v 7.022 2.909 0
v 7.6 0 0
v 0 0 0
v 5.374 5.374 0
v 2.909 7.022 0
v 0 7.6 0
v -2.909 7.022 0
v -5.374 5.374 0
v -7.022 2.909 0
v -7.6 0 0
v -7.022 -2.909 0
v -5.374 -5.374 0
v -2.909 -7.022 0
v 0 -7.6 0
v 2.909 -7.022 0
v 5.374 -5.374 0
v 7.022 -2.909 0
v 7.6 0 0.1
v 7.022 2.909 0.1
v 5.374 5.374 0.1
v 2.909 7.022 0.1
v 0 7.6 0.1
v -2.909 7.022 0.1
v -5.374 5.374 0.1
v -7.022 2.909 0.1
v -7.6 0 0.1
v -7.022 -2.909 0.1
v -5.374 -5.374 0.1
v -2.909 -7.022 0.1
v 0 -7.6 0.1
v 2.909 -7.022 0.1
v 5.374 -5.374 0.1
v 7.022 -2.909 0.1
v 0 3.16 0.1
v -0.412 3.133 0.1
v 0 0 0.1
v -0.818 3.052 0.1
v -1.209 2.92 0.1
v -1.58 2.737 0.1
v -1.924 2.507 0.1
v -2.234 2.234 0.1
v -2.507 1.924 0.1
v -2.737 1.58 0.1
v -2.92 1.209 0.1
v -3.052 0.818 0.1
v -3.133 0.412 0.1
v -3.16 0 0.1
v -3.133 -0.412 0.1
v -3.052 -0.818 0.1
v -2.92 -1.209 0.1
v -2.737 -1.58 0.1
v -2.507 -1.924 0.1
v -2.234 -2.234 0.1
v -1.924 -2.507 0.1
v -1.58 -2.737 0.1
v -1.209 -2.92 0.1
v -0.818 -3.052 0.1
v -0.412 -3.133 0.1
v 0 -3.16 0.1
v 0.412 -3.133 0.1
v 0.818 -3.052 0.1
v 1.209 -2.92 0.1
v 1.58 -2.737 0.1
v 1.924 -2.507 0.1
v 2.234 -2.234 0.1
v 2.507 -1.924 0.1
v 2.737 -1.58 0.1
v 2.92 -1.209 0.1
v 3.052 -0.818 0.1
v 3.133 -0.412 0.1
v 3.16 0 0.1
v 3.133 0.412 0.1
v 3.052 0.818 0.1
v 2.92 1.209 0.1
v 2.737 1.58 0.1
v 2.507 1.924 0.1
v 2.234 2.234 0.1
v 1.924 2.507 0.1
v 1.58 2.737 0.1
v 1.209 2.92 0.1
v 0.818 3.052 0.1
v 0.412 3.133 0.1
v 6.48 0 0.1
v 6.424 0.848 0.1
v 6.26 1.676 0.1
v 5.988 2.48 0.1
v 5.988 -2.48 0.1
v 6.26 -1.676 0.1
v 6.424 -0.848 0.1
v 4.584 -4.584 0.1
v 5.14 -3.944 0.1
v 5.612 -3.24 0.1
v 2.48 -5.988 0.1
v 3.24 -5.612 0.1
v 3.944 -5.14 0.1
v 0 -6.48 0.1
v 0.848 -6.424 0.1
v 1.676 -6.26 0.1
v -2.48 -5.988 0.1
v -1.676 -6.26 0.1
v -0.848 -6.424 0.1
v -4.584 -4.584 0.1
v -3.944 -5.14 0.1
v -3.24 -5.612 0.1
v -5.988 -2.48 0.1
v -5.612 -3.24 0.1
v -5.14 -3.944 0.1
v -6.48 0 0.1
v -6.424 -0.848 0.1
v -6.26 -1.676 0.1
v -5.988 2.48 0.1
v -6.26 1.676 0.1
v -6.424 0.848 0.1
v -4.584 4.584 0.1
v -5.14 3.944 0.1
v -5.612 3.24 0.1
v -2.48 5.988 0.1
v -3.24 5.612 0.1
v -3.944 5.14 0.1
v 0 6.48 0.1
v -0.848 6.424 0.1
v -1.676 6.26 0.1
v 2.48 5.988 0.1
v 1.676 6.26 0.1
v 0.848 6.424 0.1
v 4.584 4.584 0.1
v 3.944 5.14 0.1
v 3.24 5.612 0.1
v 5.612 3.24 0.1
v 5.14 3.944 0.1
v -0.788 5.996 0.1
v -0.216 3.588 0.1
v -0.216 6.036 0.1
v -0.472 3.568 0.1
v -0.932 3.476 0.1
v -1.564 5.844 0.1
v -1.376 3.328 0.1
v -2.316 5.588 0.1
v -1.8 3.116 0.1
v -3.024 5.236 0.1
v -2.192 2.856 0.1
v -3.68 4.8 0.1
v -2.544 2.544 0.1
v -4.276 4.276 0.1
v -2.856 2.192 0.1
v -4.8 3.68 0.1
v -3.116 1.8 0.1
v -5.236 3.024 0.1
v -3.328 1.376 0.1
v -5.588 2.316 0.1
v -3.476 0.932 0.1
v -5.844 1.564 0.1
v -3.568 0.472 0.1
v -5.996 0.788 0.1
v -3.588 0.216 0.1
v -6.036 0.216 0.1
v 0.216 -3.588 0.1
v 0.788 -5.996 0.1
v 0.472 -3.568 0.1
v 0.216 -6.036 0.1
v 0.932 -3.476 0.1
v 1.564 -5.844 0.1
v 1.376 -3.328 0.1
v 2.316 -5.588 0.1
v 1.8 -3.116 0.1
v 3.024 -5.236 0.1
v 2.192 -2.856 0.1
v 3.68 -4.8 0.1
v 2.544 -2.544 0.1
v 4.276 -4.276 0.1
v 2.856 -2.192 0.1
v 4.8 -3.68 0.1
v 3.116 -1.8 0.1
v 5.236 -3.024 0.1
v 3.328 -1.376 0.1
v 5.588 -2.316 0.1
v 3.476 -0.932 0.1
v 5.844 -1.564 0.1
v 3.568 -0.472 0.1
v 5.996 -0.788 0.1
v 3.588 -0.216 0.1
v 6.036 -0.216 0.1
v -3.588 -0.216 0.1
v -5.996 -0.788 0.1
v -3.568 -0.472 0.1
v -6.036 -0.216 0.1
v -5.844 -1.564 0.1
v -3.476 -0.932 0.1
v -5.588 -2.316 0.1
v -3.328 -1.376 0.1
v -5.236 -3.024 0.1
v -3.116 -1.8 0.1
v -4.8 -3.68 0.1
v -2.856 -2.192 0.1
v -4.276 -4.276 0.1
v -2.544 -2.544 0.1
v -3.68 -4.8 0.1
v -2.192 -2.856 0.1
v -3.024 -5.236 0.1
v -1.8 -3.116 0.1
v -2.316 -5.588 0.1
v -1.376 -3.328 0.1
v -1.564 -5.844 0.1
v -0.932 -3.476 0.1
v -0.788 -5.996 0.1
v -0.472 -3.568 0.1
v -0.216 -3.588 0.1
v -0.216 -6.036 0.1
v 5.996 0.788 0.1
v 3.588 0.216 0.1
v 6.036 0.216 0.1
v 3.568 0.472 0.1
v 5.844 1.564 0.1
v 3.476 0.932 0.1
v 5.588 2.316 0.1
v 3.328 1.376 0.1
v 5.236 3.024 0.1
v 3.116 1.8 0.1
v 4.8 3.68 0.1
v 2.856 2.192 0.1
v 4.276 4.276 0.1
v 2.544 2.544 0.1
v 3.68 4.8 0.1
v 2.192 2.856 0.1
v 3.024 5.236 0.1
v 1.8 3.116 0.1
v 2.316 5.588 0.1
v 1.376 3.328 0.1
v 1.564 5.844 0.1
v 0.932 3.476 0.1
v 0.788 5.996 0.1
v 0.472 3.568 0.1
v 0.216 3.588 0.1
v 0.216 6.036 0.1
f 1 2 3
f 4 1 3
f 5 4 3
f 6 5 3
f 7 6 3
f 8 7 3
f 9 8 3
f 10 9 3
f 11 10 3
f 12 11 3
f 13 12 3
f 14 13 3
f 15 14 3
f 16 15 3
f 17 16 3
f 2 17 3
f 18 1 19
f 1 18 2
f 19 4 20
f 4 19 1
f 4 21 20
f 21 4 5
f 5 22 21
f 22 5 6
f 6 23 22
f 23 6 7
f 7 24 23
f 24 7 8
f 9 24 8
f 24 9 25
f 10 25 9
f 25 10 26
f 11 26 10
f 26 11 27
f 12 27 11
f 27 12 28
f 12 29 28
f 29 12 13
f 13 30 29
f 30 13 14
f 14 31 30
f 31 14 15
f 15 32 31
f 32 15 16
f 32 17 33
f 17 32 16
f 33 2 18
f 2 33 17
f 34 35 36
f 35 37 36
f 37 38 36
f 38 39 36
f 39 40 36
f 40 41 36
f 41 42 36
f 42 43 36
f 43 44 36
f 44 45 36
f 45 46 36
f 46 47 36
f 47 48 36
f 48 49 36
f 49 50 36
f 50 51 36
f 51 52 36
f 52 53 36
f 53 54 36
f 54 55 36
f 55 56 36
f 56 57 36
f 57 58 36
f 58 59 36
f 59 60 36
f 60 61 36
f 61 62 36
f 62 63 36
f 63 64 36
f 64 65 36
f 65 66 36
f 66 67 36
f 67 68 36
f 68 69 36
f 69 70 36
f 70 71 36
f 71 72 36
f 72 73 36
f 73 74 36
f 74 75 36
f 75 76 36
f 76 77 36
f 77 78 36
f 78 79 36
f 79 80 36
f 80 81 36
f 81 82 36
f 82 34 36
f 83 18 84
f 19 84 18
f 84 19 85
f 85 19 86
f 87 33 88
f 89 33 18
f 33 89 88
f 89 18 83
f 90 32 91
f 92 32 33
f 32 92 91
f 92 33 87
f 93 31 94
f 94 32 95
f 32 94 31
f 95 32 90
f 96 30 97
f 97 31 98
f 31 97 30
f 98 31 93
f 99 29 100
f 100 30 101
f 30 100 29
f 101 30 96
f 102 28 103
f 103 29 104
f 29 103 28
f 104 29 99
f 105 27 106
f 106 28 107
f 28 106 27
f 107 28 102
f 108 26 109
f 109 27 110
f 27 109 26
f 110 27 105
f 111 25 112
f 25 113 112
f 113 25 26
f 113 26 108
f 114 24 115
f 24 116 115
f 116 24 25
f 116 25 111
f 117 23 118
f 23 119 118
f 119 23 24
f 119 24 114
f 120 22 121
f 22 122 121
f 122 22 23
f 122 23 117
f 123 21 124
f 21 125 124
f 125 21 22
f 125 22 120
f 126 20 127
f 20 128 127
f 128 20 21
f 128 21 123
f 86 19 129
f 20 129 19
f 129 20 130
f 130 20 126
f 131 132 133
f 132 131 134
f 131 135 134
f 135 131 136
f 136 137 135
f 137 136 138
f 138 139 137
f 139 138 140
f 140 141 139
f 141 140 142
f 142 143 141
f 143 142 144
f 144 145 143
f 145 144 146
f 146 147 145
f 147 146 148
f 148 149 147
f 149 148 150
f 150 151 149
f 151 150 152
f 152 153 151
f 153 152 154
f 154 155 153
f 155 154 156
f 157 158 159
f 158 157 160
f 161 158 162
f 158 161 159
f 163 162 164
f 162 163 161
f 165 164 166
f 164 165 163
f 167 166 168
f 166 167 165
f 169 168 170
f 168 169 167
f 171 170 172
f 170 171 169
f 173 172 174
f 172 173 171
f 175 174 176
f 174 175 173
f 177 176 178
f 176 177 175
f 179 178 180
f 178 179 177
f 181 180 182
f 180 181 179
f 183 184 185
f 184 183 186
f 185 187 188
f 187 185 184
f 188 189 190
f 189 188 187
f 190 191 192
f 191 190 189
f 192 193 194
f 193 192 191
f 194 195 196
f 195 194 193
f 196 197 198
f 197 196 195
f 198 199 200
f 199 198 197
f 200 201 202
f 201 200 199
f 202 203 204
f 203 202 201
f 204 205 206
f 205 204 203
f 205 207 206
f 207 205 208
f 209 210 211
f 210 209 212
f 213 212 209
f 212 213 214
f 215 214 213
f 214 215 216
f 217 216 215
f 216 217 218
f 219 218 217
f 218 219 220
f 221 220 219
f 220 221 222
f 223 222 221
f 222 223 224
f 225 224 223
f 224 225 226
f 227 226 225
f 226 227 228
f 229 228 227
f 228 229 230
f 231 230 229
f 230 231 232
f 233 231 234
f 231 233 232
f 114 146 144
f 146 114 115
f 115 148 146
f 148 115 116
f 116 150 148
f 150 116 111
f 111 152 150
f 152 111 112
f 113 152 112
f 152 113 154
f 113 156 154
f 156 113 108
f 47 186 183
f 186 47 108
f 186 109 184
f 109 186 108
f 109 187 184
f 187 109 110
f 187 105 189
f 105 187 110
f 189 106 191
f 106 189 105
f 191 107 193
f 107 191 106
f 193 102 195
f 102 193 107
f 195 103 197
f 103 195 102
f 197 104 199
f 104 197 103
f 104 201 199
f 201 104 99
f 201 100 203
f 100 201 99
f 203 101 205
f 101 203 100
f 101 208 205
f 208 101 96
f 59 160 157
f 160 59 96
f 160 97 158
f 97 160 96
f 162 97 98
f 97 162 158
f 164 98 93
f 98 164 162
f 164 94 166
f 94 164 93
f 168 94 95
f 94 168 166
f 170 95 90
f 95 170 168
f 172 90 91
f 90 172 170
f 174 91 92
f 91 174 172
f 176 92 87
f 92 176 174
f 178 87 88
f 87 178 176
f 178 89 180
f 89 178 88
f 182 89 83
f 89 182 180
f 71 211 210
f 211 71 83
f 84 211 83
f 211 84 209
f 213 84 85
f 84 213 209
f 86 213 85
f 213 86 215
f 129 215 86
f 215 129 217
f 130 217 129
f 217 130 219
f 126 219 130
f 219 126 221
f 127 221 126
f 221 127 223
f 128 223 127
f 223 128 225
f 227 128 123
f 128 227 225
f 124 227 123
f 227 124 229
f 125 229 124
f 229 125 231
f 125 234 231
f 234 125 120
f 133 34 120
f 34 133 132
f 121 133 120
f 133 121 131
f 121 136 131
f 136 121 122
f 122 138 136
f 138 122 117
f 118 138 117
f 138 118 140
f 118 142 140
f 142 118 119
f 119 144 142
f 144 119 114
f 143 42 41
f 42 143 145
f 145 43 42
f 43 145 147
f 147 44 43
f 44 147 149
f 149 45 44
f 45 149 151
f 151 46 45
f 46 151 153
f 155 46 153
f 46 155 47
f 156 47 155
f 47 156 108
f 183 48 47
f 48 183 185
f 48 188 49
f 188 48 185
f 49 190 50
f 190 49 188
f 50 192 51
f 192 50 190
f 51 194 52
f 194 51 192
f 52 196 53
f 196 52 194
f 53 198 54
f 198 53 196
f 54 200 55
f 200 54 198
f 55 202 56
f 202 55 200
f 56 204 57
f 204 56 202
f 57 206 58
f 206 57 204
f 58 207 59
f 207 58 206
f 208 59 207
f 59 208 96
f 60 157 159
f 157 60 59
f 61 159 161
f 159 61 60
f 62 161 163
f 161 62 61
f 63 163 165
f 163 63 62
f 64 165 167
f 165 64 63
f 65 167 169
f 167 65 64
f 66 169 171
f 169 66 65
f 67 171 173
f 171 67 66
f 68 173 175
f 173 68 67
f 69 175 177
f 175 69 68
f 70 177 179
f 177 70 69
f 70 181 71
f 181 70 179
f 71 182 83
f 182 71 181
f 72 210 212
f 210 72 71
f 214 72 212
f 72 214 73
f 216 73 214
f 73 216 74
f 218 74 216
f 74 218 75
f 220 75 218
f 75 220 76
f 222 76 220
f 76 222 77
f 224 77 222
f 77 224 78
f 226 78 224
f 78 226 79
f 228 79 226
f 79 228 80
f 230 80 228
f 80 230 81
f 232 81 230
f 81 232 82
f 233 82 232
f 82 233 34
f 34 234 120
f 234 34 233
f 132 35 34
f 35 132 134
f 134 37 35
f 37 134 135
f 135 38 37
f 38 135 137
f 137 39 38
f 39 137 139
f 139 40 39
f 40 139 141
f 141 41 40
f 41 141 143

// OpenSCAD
// file: ../p/1-8chrd.scad
use <../lib.scad>
function ldraw_lib__1_8chrd() = [
// 0 Chord 0.125
// 0 Name: 1-8chrd.dat
// 0 Author: Orion Pobursky [OrionP]
// 0 !LDRAW_ORG Primitive UPDATE 2023-05
// 0 !LICENSE Licensed under CC BY 4.0 : see CAreadme.txt
// 
// 0 BFC CERTIFY CCW
  [0,"BFC","CERTIFY"],
  [0,"BFC","CCW"],
// 
// 0 !HISTORY 2004-04-22 [PTadmin] Official Update 2004-02
// 0 !HISTORY 2007-06-22 [PTadmin] Header formatted for Contributor Agreement
// 0 !HISTORY 2008-07-01 [PTadmin] Official Update 2008-01
// 0 !HISTORY 2023-10-27 [OrionP] Rebuilt with PrimGen2, original author westrate
// 0 !HISTORY 2023-10-31 [OrionP] Official Update 2023-05
// 
// 3 16 1 0 0 0.9239 0 0.3827 0.7071 0 0.7071
  [3,16,1,0,0,0.9239,0,0.3827,0.7071,0,0.7071],
];
module ldraw_lib__1_8chrd(step=0, col=false, unit=2/5, alt=false, line=0.2, solid=!$preview)
    makepoly(ldraw_lib__1_8chrd(), step=step, col=col, unit=unit, alt=alt, line=line, solid=solid);
ldraw_lib__1_8chrd(line=0.2);
// file: ../p/4-4disc.scad
use <../lib.scad>
function ldraw_lib__4_4disc() = [
// 0 Disc 1.0
// 0 Name: 4-4disc.dat
// 0 Author: James Jessiman
// 0 !LDRAW_ORG Primitive UPDATE 2002-02
// 0 !LICENSE Licensed under CC BY 4.0 : see CAreadme.txt
// 
// 0 BFC CERTIFY CCW
  [0,"BFC","CERTIFY"],
  [0,"BFC","CCW"],
// 
// 0 !HISTORY 1998-12-15 [PTadmin] Official Update 1998-10
// 0 !HISTORY 2002-03-23 [sbliss] Added BFC statement
// 0 !HISTORY 2002-04-25 [PTadmin] Official Update 2002-02
// 0 !HISTORY 2007-06-24 [PTadmin] Header formatted for Contributor Agreement
// 0 !HISTORY 2008-07-01 [PTadmin] Official Update 2008-01
// 
// 
// 3 16 0 0 0 1 0 0 0.9239 0 0.3827
  [3,16,0,0,0,1,0,0,0.9239,0,0.3827],
// 3 16 0 0 0 0.9239 0 0.3827 0.7071 0 0.7071
  [3,16,0,0,0,0.9239,0,0.3827,0.7071,0,0.7071],
// 3 16 0 0 0 0.7071 0 0.7071 0.3827 0 0.9239
  [3,16,0,0,0,0.7071,0,0.7071,0.3827,0,0.9239],
// 3 16 0 0 0 0.3827 0 0.9239 0 0 1
  [3,16,0,0,0,0.3827,0,0.9239,0,0,1],
// 3 16 0 0 0 0 0 1 -0.3827 0 0.9239
  [3,16,0,0,0,0,0,1,-0.3827,0,0.9239],
// 3 16 0 0 0 -0.3827 0 0.9239 -0.7071 0 0.7071
  [3,16,0,0,0,-0.3827,0,0.9239,-0.7071,0,0.7071],
// 3 16 0 0 0 -0.7071 0 0.7071 -0.9239 0 0.3827
  [3,16,0,0,0,-0.7071,0,0.7071,-0.9239,0,0.3827],
// 3 16 0 0 0 -0.9239 0 0.3827 -1 0 -0
  [3,16,0,0,0,-0.9239,0,0.3827,-1,0,-0],
// 3 16 0 0 0 -1 0 -0 -0.9239 0 -0.3827
  [3,16,0,0,0,-1,0,-0,-0.9239,0,-0.3827],
// 3 16 0 0 0 -0.9239 0 -0.3827 -0.7071 0 -0.7071
  [3,16,0,0,0,-0.9239,0,-0.3827,-0.7071,0,-0.7071],
// 3 16 0 0 0 -0.7071 0 -0.7071 -0.3827 0 -0.9239
  [3,16,0,0,0,-0.7071,0,-0.7071,-0.3827,0,-0.9239],
// 3 16 0 0 0 -0.3827 0 -0.9239 0 0 -1
  [3,16,0,0,0,-0.3827,0,-0.9239,0,0,-1],
// 3 16 0 0 0 0 0 -1 0.3827 0 -0.9239
  [3,16,0,0,0,0,0,-1,0.3827,0,-0.9239],
// 3 16 0 0 0 0.3827 0 -0.9239 0.7071 0 -0.7071
  [3,16,0,0,0,0.3827,0,-0.9239,0.7071,0,-0.7071],
// 3 16 0 0 0 0.7071 0 -0.7071 0.9239 0 -0.3827
  [3,16,0,0,0,0.7071,0,-0.7071,0.9239,0,-0.3827],
// 3 16 0 0 0 0.9239 0 -0.3827 1 0 0
  [3,16,0,0,0,0.9239,0,-0.3827,1,0,0],
// 0
];
module ldraw_lib__4_4disc(step=0, col=false, unit=2/5, alt=false, line=0.2, solid=!$preview)
    makepoly(ldraw_lib__4_4disc(), step=step, col=col, unit=unit, alt=alt, line=line, solid=solid);
ldraw_lib__4_4disc(line=0.2);
// file: ../p/4-4cyli.scad
use <../lib.scad>
function ldraw_lib__4_4cyli() = [
// 0 Cylinder 1.0
// 0 Name: 4-4cyli.dat
// 0 Author: James Jessiman
// 0 !LDRAW_ORG Primitive UPDATE 2005-01
// 0 !LICENSE Licensed under CC BY 4.0 : see CAreadme.txt
// 
// 0 BFC CERTIFY CCW
  [0,"BFC","CERTIFY"],
  [0,"BFC","CCW"],
// 
// 0 !HISTORY 1998-12-15 [PTadmin] Official Update 1998-10
// 0 !HISTORY 2002-03-23 [sbliss] Added BFC statement; merged headers from files in distributions LDraw 0.27 and Complete.
// 0 !HISTORY 2002-04-25 [PTadmin] Official Update 2002-02
// 0 !HISTORY 2004-12-14 [guyvivan] BFC CCW
// 0 !HISTORY 2005-12-28 [PTadmin] Official Update 2005-01
// 0 !HISTORY 2007-06-24 [PTadmin] Header formatted for Contributor Agreement
// 0 !HISTORY 2008-07-01 [PTadmin] Official Update 2008-01
// 
// 
// 4 16 1 1 0 0.9239 1 0.3827 0.9239 0 0.3827 1 0 0
  [4,16,1,1,0,0.9239,1,0.3827,0.9239,0,0.3827,1,0,0],
// 5 24 1 0 0 1 1 0 0.9239 0 0.3827 0.9239 0 -0.3827
  [5,24,1,0,0,1,1,0,0.9239,0,0.3827,0.9239,0,-0.3827],
// 4 16 0.9239 1 0.3827 0.7071 1 0.7071 0.7071 0 0.7071 0.9239 0 0.3827
  [4,16,0.9239,1,0.3827,0.7071,1,0.7071,0.7071,0,0.7071,0.9239,0,0.3827],
// 5 24 0.9239 0 0.3827 0.9239 1 0.3827 0.7071 0 0.7071 1 0 0
  [5,24,0.9239,0,0.3827,0.9239,1,0.3827,0.7071,0,0.7071,1,0,0],
// 4 16 0.7071 1 0.7071 0.3827 1 0.9239 0.3827 0 0.9239 0.7071 0 0.7071
  [4,16,0.7071,1,0.7071,0.3827,1,0.9239,0.3827,0,0.9239,0.7071,0,0.7071],
// 5 24 0.7071 0 0.7071 0.7071 1 0.7071 0.3827 0 0.9239 0.9239 0 0.3827
  [5,24,0.7071,0,0.7071,0.7071,1,0.7071,0.3827,0,0.9239,0.9239,0,0.3827],
// 4 16 0.3827 1 0.9239 0 1 1 0 0 1 0.3827 0 0.9239
  [4,16,0.3827,1,0.9239,0,1,1,0,0,1,0.3827,0,0.9239],
// 5 24 0.3827 0 0.9239 0.3827 1 0.9239 0 0 1 0.7071 0 0.7071
  [5,24,0.3827,0,0.9239,0.3827,1,0.9239,0,0,1,0.7071,0,0.7071],
// 4 16 0 1 1 -0.3827 1 0.9239 -0.3827 0 0.9239 0 0 1
  [4,16,0,1,1,-0.3827,1,0.9239,-0.3827,0,0.9239,0,0,1],
// 5 24 0 0 1 0 1 1 -0.3827 0 0.9239 0.3827 0 0.9239
  [5,24,0,0,1,0,1,1,-0.3827,0,0.9239,0.3827,0,0.9239],
// 4 16 -0.3827 1 0.9239 -0.7071 1 0.7071 -0.7071 0 0.7071 -0.3827 0 0.9239
  [4,16,-0.3827,1,0.9239,-0.7071,1,0.7071,-0.7071,0,0.7071,-0.3827,0,0.9239],
// 5 24 -0.3827 0 0.9239 -0.3827 1 0.9239 -0.7071 0 0.7071 0 0 1
  [5,24,-0.3827,0,0.9239,-0.3827,1,0.9239,-0.7071,0,0.7071,0,0,1],
// 4 16 -0.7071 1 0.7071 -0.9239 1 0.3827 -0.9239 0 0.3827 -0.7071 0 0.7071
  [4,16,-0.7071,1,0.7071,-0.9239,1,0.3827,-0.9239,0,0.3827,-0.7071,0,0.7071],
// 5 24 -0.7071 0 0.7071 -0.7071 1 0.7071 -0.9239 0 0.3827 -0.3827 0 0.9239
  [5,24,-0.7071,0,0.7071,-0.7071,1,0.7071,-0.9239,0,0.3827,-0.3827,0,0.9239],
// 4 16 -0.9239 1 0.3827 -1 1 0 -1 0 0 -0.9239 0 0.3827
  [4,16,-0.9239,1,0.3827,-1,1,0,-1,0,0,-0.9239,0,0.3827],
// 5 24 -0.9239 0 0.3827 -0.9239 1 0.3827 -1 0 0 -0.7071 0 0.7071
  [5,24,-0.9239,0,0.3827,-0.9239,1,0.3827,-1,0,0,-0.7071,0,0.7071],
// 4 16 -1 1 0 -0.9239 1 -0.3827 -0.9239 0 -0.3827 -1 0 0
  [4,16,-1,1,0,-0.9239,1,-0.3827,-0.9239,0,-0.3827,-1,0,0],
// 5 24 -1 0 0 -1 1 0 -0.9239 0 -0.3827 -0.9239 0 0.3827
  [5,24,-1,0,0,-1,1,0,-0.9239,0,-0.3827,-0.9239,0,0.3827],
// 4 16 -0.9239 1 -0.3827 -0.7071 1 -0.7071 -0.7071 0 -0.7071 -0.9239 0 -0.3827
  [4,16,-0.9239,1,-0.3827,-0.7071,1,-0.7071,-0.7071,0,-0.7071,-0.9239,0,-0.3827],
// 5 24 -0.9239 0 -0.3827 -0.9239 1 -0.3827 -0.7071 0 -0.7071 -1 0 0
  [5,24,-0.9239,0,-0.3827,-0.9239,1,-0.3827,-0.7071,0,-0.7071,-1,0,0],
// 4 16 -0.7071 1 -0.7071 -0.3827 1 -0.9239 -0.3827 0 -0.9239 -0.7071 0 -0.7071
  [4,16,-0.7071,1,-0.7071,-0.3827,1,-0.9239,-0.3827,0,-0.9239,-0.7071,0,-0.7071],
// 5 24 -0.7071 0 -0.7071 -0.7071 1 -0.7071 -0.3827 0 -0.9239 -0.9239 0 -0.3827
  [5,24,-0.7071,0,-0.7071,-0.7071,1,-0.7071,-0.3827,0,-0.9239,-0.9239,0,-0.3827],
// 4 16 -0.3827 1 -0.9239 0 1 -1 0 0 -1 -0.3827 0 -0.9239
  [4,16,-0.3827,1,-0.9239,0,1,-1,0,0,-1,-0.3827,0,-0.9239],
// 5 24 -0.3827 0 -0.9239 -0.3827 1 -0.9239 0 0 -1 -0.7071 0 -0.7071
  [5,24,-0.3827,0,-0.9239,-0.3827,1,-0.9239,0,0,-1,-0.7071,0,-0.7071],
// 4 16 0 1 -1 0.3827 1 -0.9239 0.3827 0 -0.9239 0 0 -1
  [4,16,0,1,-1,0.3827,1,-0.9239,0.3827,0,-0.9239,0,0,-1],
// 5 24 0 0 -1 0 1 -1 0.3827 0 -0.9239 -0.3827 0 -0.9239
  [5,24,0,0,-1,0,1,-1,0.3827,0,-0.9239,-0.3827,0,-0.9239],
// 4 16 0.3827 1 -0.9239 0.7071 1 -0.7071 0.7071 0 -0.7071 0.3827 0 -0.9239
  [4,16,0.3827,1,-0.9239,0.7071,1,-0.7071,0.7071,0,-0.7071,0.3827,0,-0.9239],
// 5 24 0.3827 0 -0.9239 0.3827 1 -0.9239 0.7071 0 -0.7071 0 0 -1
  [5,24,0.3827,0,-0.9239,0.3827,1,-0.9239,0.7071,0,-0.7071,0,0,-1],
// 4 16 0.7071 1 -0.7071 0.9239 1 -0.3827 0.9239 0 -0.3827 0.7071 0 -0.7071
  [4,16,0.7071,1,-0.7071,0.9239,1,-0.3827,0.9239,0,-0.3827,0.7071,0,-0.7071],
// 5 24 0.7071 0 -0.7071 0.7071 1 -0.7071 0.9239 0 -0.3827 0.3827 0 -0.9239
  [5,24,0.7071,0,-0.7071,0.7071,1,-0.7071,0.9239,0,-0.3827,0.3827,0,-0.9239],
// 4 16 0.9239 1 -0.3827 1 1 0 1 0 0 0.9239 0 -0.3827
  [4,16,0.9239,1,-0.3827,1,1,0,1,0,0,0.9239,0,-0.3827],
// 5 24 0.9239 0 -0.3827 0.9239 1 -0.3827 1 0 0 0.7071 0 -0.7071
  [5,24,0.9239,0,-0.3827,0.9239,1,-0.3827,1,0,0,0.7071,0,-0.7071],
// 0
];
module ldraw_lib__4_4cyli(step=0, col=false, unit=2/5, alt=false, line=0.2, solid=!$preview)
    makepoly(ldraw_lib__4_4cyli(), step=step, col=col, unit=unit, alt=alt, line=line, solid=solid);
ldraw_lib__4_4cyli(line=0.2);
// file: s/820671as02.scad
use <../../lib.scad>
use <../../p/1-8chrd.scad>
function ldraw_lib__s__820671as02() = [
// 0 ~Sticker  1.9 x  1.9 Round with Lifepreserver - Outer Ring Eighth
// 0 Name: s\820671as02.dat
// 0 Author: Takeshi Takahashi [RainbowDolphin]
// 0 !LDRAW_ORG Subpart UPDATE 2024-09
// 0 !LICENSE Licensed under CC BY 4.0 : see CAreadme.txt
// 
// 0 BFC CERTIFY CCW
  [0,"BFC","CERTIFY"],
  [0,"BFC","CCW"],
// 
// 0 !HISTORY 2024-10-27 [OrionP] Official Update 2024-09
// 
// 1 16 0 0 0 19 0 0 0 1 0 0 0 19 1-8chrd.dat
  [1,16,0,0,0,19,0,0,0,1,0,0,0,19, ldraw_lib__1_8chrd()],
// 3 16 16.2 0 0 19 0 0 16.06 0 2.12
  [3,16,16.2,0,0,19,0,0,16.06,0,2.12],
// 3 16 16.06 0 2.12 19 0 0 15.65 0 4.19
  [3,16,16.06,0,2.12,19,0,0,15.65,0,4.19],
// 3 16 15.65 0 4.19 19 0 0 14.97 0 6.2
  [3,16,15.65,0,4.19,19,0,0,14.97,0,6.2],
// 3 16 14.97 0 6.2 19 0 0 13.4349 0 13.4349
  [3,16,14.97,0,6.2,19,0,0,13.4349,0,13.4349],
// 3 16 14.97 0 6.2 13.4349 0 13.4349 14.03 0 8.1
  [3,16,14.97,0,6.2,13.4349,0,13.4349,14.03,0,8.1],
// 3 16 14.03 0 8.1 13.4349 0 13.4349 12.85 0 9.86
  [3,16,14.03,0,8.1,13.4349,0,13.4349,12.85,0,9.86],
// 3 16 12.85 0 9.86 13.4349 0 13.4349 11.46 0 11.46
  [3,16,12.85,0,9.86,13.4349,0,13.4349,11.46,0,11.46],
];
module ldraw_lib__s__820671as02(step=0, col=false, unit=2/5, alt=false, line=0.2, solid=!$preview)
    makepoly(ldraw_lib__s__820671as02(), step=step, col=col, unit=unit, alt=alt, line=line, solid=solid);
ldraw_lib__s__820671as02(line=0.2);
// file: s/820671as01.scad
use <../../lib.scad>
function ldraw_lib__s__820671as01() = [
// 0 ~Pattern White and Red Four-Segment Lifepreserver - Eighth
// 0 Name: s\820671as01.dat
// 0 Author: Takeshi Takahashi [RainbowDolphin]
// 0 !LDRAW_ORG Subpart UPDATE 2024-09
// 0 !LICENSE Licensed under CC BY 4.0 : see CAreadme.txt
// 
// 0 BFC CERTIFY CCW
  [0,"BFC","CERTIFY"],
  [0,"BFC","CCW"],
// 
// 0 !HISTORY 2024-05-01 [RainbowDolphin] Subfiled the pattern for common use
// 0 !HISTORY 2024-10-27 [OrionP] Official Update 2024-09
// 
// 4 0 7.9 0 0 16.2 0 0 15.09 0 .54 8.97 0 .54
  [4,0,7.9,0,0,16.2,0,0,15.09,0,.54,8.97,0,.54],
// 4 0 15.09 0 .54 16.2 0 0 16.06 0 2.12 14.99 0 1.97
  [4,0,15.09,0,.54,16.2,0,0,16.06,0,2.12,14.99,0,1.97],
// 4 0 14.61 0 3.91 14.99 0 1.97 16.06 0 2.12 15.65 0 4.19
  [4,0,14.61,0,3.91,14.99,0,1.97,16.06,0,2.12,15.65,0,4.19],
// 4 0 13.97 0 5.79 14.61 0 3.91 15.65 0 4.19 14.97 0 6.2
  [4,0,13.97,0,5.79,14.61,0,3.91,15.65,0,4.19,14.97,0,6.2],
// 4 0 13.09 0 7.56 13.97 0 5.79 14.97 0 6.2 14.03 0 8.1
  [4,0,13.09,0,7.56,13.97,0,5.79,14.97,0,6.2,14.03,0,8.1],
// 4 0 12 0 9.2 13.09 0 7.56 14.03 0 8.1 12.85 0 9.86
  [4,0,12,0,9.2,13.09,0,7.56,14.03,0,8.1,12.85,0,9.86],
// 4 0 10.69 0 10.69 12 0 9.2 12.85 0 9.86 11.46 0 11.46
  [4,0,10.69,0,10.69,12,0,9.2,12.85,0,9.86,11.46,0,11.46],
// 4 0 7.83206 0 1.03095 7.9 0 0 8.97 0 .54 8.92 0 1.18
  [4,0,7.83206,0,1.03095,7.9,0,0,8.97,0,.54,8.92,0,1.18],
// 4 0 7.63061 0 2.04452 7.83206 0 1.03095 8.92 0 1.18 8.69 0 2.33
  [4,0,7.63061,0,2.04452,7.83206,0,1.03095,8.92,0,1.18,8.69,0,2.33],
// 4 0 7.29881 0 3.02333 7.63061 0 2.04452 8.69 0 2.33 8.32 0 3.44
  [4,0,7.29881,0,3.02333,7.63061,0,2.04452,8.69,0,2.33,8.32,0,3.44],
// 4 0 6.8414 0 3.95 7.29881 0 3.02333 8.32 0 3.44 7.79 0 4.5
  [4,0,6.8414,0,3.95,7.29881,0,3.02333,8.32,0,3.44,7.79,0,4.5],
// 4 0 6.26786 0 4.80952 6.8414 0 3.95 7.79 0 4.5 7.14 0 5.48
  [4,0,6.26786,0,4.80952,6.8414,0,3.95,7.79,0,4.5,7.14,0,5.48],
// 4 0 5.58609 0 5.58609 6.26786 0 4.80952 7.14 0 5.48 6.36 0 6.36
  [4,0,5.58609,0,5.58609,6.26786,0,4.80952,7.14,0,5.48,6.36,0,6.36],
// 4 16 8.92 0 1.18 8.97 0 .54 15.09 0 .54 14.99 0 1.97
  [4,16,8.92,0,1.18,8.97,0,.54,15.09,0,.54,14.99,0,1.97],
// 4 16 8.69 0 2.33 8.92 0 1.18 14.99 0 1.97 14.61 0 3.91
  [4,16,8.69,0,2.33,8.92,0,1.18,14.99,0,1.97,14.61,0,3.91],
// 4 16 8.32 0 3.44 8.69 0 2.33 14.61 0 3.91 13.97 0 5.79
  [4,16,8.32,0,3.44,8.69,0,2.33,14.61,0,3.91,13.97,0,5.79],
// 4 16 7.79 0 4.5 8.32 0 3.44 13.97 0 5.79 13.09 0 7.56
  [4,16,7.79,0,4.5,8.32,0,3.44,13.97,0,5.79,13.09,0,7.56],
// 4 16 7.14 0 5.48 7.79 0 4.5 13.09 0 7.56 12 0 9.2
  [4,16,7.14,0,5.48,7.79,0,4.5,13.09,0,7.56,12,0,9.2],
// 4 16 6.36 0 6.36 7.14 0 5.48 12 0 9.2 10.69 0 10.69
  [4,16,6.36,0,6.36,7.14,0,5.48,12,0,9.2,10.69,0,10.69],
];
module ldraw_lib__s__820671as01(step=0, col=false, unit=2/5, alt=false, line=0.2, solid=!$preview)
    makepoly(ldraw_lib__s__820671as01(), step=step, col=col, unit=unit, alt=alt, line=line, solid=solid);
ldraw_lib__s__820671as01(line=0.2);
// file: ../p/48/4-4disc.scad
use <../../lib.scad>
function ldraw_lib__48__4_4disc() = [
// 0 Hi-Res Disc 1.0
// 0 Name: 48\4-4disc.dat
// 0 Author: Willy Tschager [Holly-Wood]
// 0 !LDRAW_ORG 48_Primitive UPDATE 2024-01
// 0 !LICENSE Licensed under CC BY 4.0 : see CAreadme.txt
// 
// 0 BFC CERTIFY CCW
  [0,"BFC","CERTIFY"],
  [0,"BFC","CCW"],
// 
// 0 !HISTORY 2004-11-06 [PTadmin] Official Update 2004-04
// 0 !HISTORY 2007-06-24 [PTadmin] Header formatted for Contributor Agreement
// 0 !HISTORY 2008-07-01 [PTadmin] Official Update 2008-01
// 0 !HISTORY 2012-02-27 [Philo] Changed to CCW
// 0 !HISTORY 2012-08-09 [PTadmin] Official Update 2012-02
// 0 !HISTORY 2024-01-08 [Holly-Wood] Complete regeneration, original by hmick
// 0 !HISTORY 2024-01-29 [OrionP] Official Update 2024-01
// 
// 3 16 0 0 0 1 0 0 0.9914 0 0.1305
  [3,16,0,0,0,1,0,0,0.9914,0,0.1305],
// 3 16 0 0 0 0.9914 0 0.1305 0.9659 0 0.2588
  [3,16,0,0,0,0.9914,0,0.1305,0.9659,0,0.2588],
// 3 16 0 0 0 0.9659 0 0.2588 0.9239 0 0.3827
  [3,16,0,0,0,0.9659,0,0.2588,0.9239,0,0.3827],
// 3 16 0 0 0 0.9239 0 0.3827 0.866 0 0.5
  [3,16,0,0,0,0.9239,0,0.3827,0.866,0,0.5],
// 3 16 0 0 0 0.866 0 0.5 0.7934 0 0.6088
  [3,16,0,0,0,0.866,0,0.5,0.7934,0,0.6088],
// 3 16 0 0 0 0.7934 0 0.6088 0.7071 0 0.7071
  [3,16,0,0,0,0.7934,0,0.6088,0.7071,0,0.7071],
// 3 16 0 0 0 0.7071 0 0.7071 0.6088 0 0.7934
  [3,16,0,0,0,0.7071,0,0.7071,0.6088,0,0.7934],
// 3 16 0 0 0 0.6088 0 0.7934 0.5 0 0.866
  [3,16,0,0,0,0.6088,0,0.7934,0.5,0,0.866],
// 3 16 0 0 0 0.5 0 0.866 0.3827 0 0.9239
  [3,16,0,0,0,0.5,0,0.866,0.3827,0,0.9239],
// 3 16 0 0 0 0.3827 0 0.9239 0.2588 0 0.9659
  [3,16,0,0,0,0.3827,0,0.9239,0.2588,0,0.9659],
// 3 16 0 0 0 0.2588 0 0.9659 0.1305 0 0.9914
  [3,16,0,0,0,0.2588,0,0.9659,0.1305,0,0.9914],
// 3 16 0 0 0 0.1305 0 0.9914 0 0 1
  [3,16,0,0,0,0.1305,0,0.9914,0,0,1],
// 3 16 0 0 0 0 0 1 -0.1305 0 0.9914
  [3,16,0,0,0,0,0,1,-0.1305,0,0.9914],
// 3 16 0 0 0 -0.1305 0 0.9914 -0.2588 0 0.9659
  [3,16,0,0,0,-0.1305,0,0.9914,-0.2588,0,0.9659],
// 3 16 0 0 0 -0.2588 0 0.9659 -0.3827 0 0.9239
  [3,16,0,0,0,-0.2588,0,0.9659,-0.3827,0,0.9239],
// 3 16 0 0 0 -0.3827 0 0.9239 -0.5 0 0.866
  [3,16,0,0,0,-0.3827,0,0.9239,-0.5,0,0.866],
// 3 16 0 0 0 -0.5 0 0.866 -0.6088 0 0.7934
  [3,16,0,0,0,-0.5,0,0.866,-0.6088,0,0.7934],
// 3 16 0 0 0 -0.6088 0 0.7934 -0.7071 0 0.7071
  [3,16,0,0,0,-0.6088,0,0.7934,-0.7071,0,0.7071],
// 3 16 0 0 0 -0.7071 0 0.7071 -0.7934 0 0.6088
  [3,16,0,0,0,-0.7071,0,0.7071,-0.7934,0,0.6088],
// 3 16 0 0 0 -0.7934 0 0.6088 -0.866 0 0.5
  [3,16,0,0,0,-0.7934,0,0.6088,-0.866,0,0.5],
// 3 16 0 0 0 -0.866 0 0.5 -0.9239 0 0.3827
  [3,16,0,0,0,-0.866,0,0.5,-0.9239,0,0.3827],
// 3 16 0 0 0 -0.9239 0 0.3827 -0.9659 0 0.2588
  [3,16,0,0,0,-0.9239,0,0.3827,-0.9659,0,0.2588],
// 3 16 0 0 0 -0.9659 0 0.2588 -0.9914 0 0.1305
  [3,16,0,0,0,-0.9659,0,0.2588,-0.9914,0,0.1305],
// 3 16 0 0 0 -0.9914 0 0.1305 -1 0 0
  [3,16,0,0,0,-0.9914,0,0.1305,-1,0,0],
// 3 16 0 0 0 -1 0 0 -0.9914 0 -0.1305
  [3,16,0,0,0,-1,0,0,-0.9914,0,-0.1305],
// 3 16 0 0 0 -0.9914 0 -0.1305 -0.9659 0 -0.2588
  [3,16,0,0,0,-0.9914,0,-0.1305,-0.9659,0,-0.2588],
// 3 16 0 0 0 -0.9659 0 -0.2588 -0.9239 0 -0.3827
  [3,16,0,0,0,-0.9659,0,-0.2588,-0.9239,0,-0.3827],
// 3 16 0 0 0 -0.9239 0 -0.3827 -0.866 0 -0.5
  [3,16,0,0,0,-0.9239,0,-0.3827,-0.866,0,-0.5],
// 3 16 0 0 0 -0.866 0 -0.5 -0.7934 0 -0.6088
  [3,16,0,0,0,-0.866,0,-0.5,-0.7934,0,-0.6088],
// 3 16 0 0 0 -0.7934 0 -0.6088 -0.7071 0 -0.7071
  [3,16,0,0,0,-0.7934,0,-0.6088,-0.7071,0,-0.7071],
// 3 16 0 0 0 -0.7071 0 -0.7071 -0.6088 0 -0.7934
  [3,16,0,0,0,-0.7071,0,-0.7071,-0.6088,0,-0.7934],
// 3 16 0 0 0 -0.6088 0 -0.7934 -0.5 0 -0.866
  [3,16,0,0,0,-0.6088,0,-0.7934,-0.5,0,-0.866],
// 3 16 0 0 0 -0.5 0 -0.866 -0.3827 0 -0.9239
  [3,16,0,0,0,-0.5,0,-0.866,-0.3827,0,-0.9239],
// 3 16 0 0 0 -0.3827 0 -0.9239 -0.2588 0 -0.9659
  [3,16,0,0,0,-0.3827,0,-0.9239,-0.2588,0,-0.9659],
// 3 16 0 0 0 -0.2588 0 -0.9659 -0.1305 0 -0.9914
  [3,16,0,0,0,-0.2588,0,-0.9659,-0.1305,0,-0.9914],
// 3 16 0 0 0 -0.1305 0 -0.9914 0 0 -1
  [3,16,0,0,0,-0.1305,0,-0.9914,0,0,-1],
// 3 16 0 0 0 0 0 -1 0.1305 0 -0.9914
  [3,16,0,0,0,0,0,-1,0.1305,0,-0.9914],
// 3 16 0 0 0 0.1305 0 -0.9914 0.2588 0 -0.9659
  [3,16,0,0,0,0.1305,0,-0.9914,0.2588,0,-0.9659],
// 3 16 0 0 0 0.2588 0 -0.9659 0.3827 0 -0.9239
  [3,16,0,0,0,0.2588,0,-0.9659,0.3827,0,-0.9239],
// 3 16 0 0 0 0.3827 0 -0.9239 0.5 0 -0.866
  [3,16,0,0,0,0.3827,0,-0.9239,0.5,0,-0.866],
// 3 16 0 0 0 0.5 0 -0.866 0.6088 0 -0.7934
  [3,16,0,0,0,0.5,0,-0.866,0.6088,0,-0.7934],
// 3 16 0 0 0 0.6088 0 -0.7934 0.7071 0 -0.7071
  [3,16,0,0,0,0.6088,0,-0.7934,0.7071,0,-0.7071],
// 3 16 0 0 0 0.7071 0 -0.7071 0.7934 0 -0.6088
  [3,16,0,0,0,0.7071,0,-0.7071,0.7934,0,-0.6088],
// 3 16 0 0 0 0.7934 0 -0.6088 0.866 0 -0.5
  [3,16,0,0,0,0.7934,0,-0.6088,0.866,0,-0.5],
// 3 16 0 0 0 0.866 0 -0.5 0.9239 0 -0.3827
  [3,16,0,0,0,0.866,0,-0.5,0.9239,0,-0.3827],
// 3 16 0 0 0 0.9239 0 -0.3827 0.9659 0 -0.2588
  [3,16,0,0,0,0.9239,0,-0.3827,0.9659,0,-0.2588],
// 3 16 0 0 0 0.9659 0 -0.2588 0.9914 0 -0.1305
  [3,16,0,0,0,0.9659,0,-0.2588,0.9914,0,-0.1305],
// 3 16 0 0 0 0.9914 0 -0.1305 1 0 0
  [3,16,0,0,0,0.9914,0,-0.1305,1,0,0],
// 0 // Build by LDPartEditor (PrimGen 2.X)
];
module ldraw_lib__48__4_4disc(step=0, col=false, unit=2/5, alt=false, line=0.2, solid=!$preview)
    makepoly(ldraw_lib__48__4_4disc(), step=step, col=col, unit=unit, alt=alt, line=line, solid=solid);
ldraw_lib__48__4_4disc(line=0.2);
// file: ../p/4-4cylc3.scad
use <../lib.scad>
use <4-4cyli.scad>
use <4-4disc.scad>
function ldraw_lib__4_4cylc3() = [
// 0 Cylinder Closed 1.0 without Top or Bottom Edge Lines
// 0 Name: 4-4cylc3.dat
// 0 Author: Chris Dee [cwdee]
// 0 !LDRAW_ORG Primitive UPDATE 2017-01
// 0 !LICENSE Licensed under CC BY 4.0 : see CAreadme.txt
// 
// 0 BFC CERTIFY CCW
  [0,"BFC","CERTIFY"],
  [0,"BFC","CCW"],
// 
// 0 !HISTORY 2017-12-30 [PTadmin] Official Update 2017-01
// 
// 
// 1 16 0 0 0 1 0 0 0 1 0 0 0 1 4-4disc.dat
  [1,16,0,0,0,1,0,0,0,1,0,0,0,1, ldraw_lib__4_4disc()],
// 1 16 0 0 0 1 0 0 0 1 0 0 0 1 4-4cyli.dat
  [1,16,0,0,0,1,0,0,0,1,0,0,0,1, ldraw_lib__4_4cyli()],
// 0
];
module ldraw_lib__4_4cylc3(step=0, col=false, unit=2/5, alt=false, line=0.2, solid=!$preview)
    makepoly(ldraw_lib__4_4cylc3(), step=step, col=col, unit=unit, alt=alt, line=line, solid=solid);
ldraw_lib__4_4cylc3(line=0.2);
// file: 820671a.scad
use <../lib.scad>
use <../p/4-4cylc3.scad>
use <../p/48/4-4disc.scad>
use <s/820671as01.scad>
use <s/820671as02.scad>
function ldraw_lib__820671a() = [
// 0 Sticker  1.9 x  1.9 Round with Lifepreserver
// 0 Name: 820671a.dat
// 0 Author: Takeshi Takahashi [RainbowDolphin]
// 0 !LDRAW_ORG Part UPDATE 2024-09
// 0 !LICENSE Licensed under CC BY 4.0 : see CAreadme.txt
// 
// 0 BFC CERTIFY CCW
  [0,"BFC","CERTIFY"],
  [0,"BFC","CCW"],
// 
// 0 !KEYWORDS harbour, Nautica, Pier police, Set 6540
// 
// 0 !HISTORY 2003-07-28 [Steffen] BFCed, re-worked pattern completely with primitives, changed part into sticker
// 0 !HISTORY 2004-04-22 [PTadmin] Official Update 2004-02
// 0 !HISTORY 2007-10-08 [PTadmin] Header formatted for Contributor Agreement
// 0 !HISTORY 2008-07-01 [PTadmin] Official Update 2008-01
// 0 !HISTORY 2016-07-01 [cwdee] Updated description
// 0 !HISTORY 2016-12-31 [PTadmin] Official Update 2016-01
// 0 !HISTORY 2021-08-12 [MagFors] Removed edge lines and overlapping
// 0 !HISTORY 2021-08-15 [MagFors] Added missing black border
// 0 !HISTORY 2021-08-15 [PTadmin] Renamed from s10
// 0 !HISTORY 2022-07-18 [PTadmin] Official Update 2022-04
// 0 !HISTORY 2024-05-01 [RainbowDolphin] Complete re-write, original by Thomas Burger [grapeape]
// 0 !HISTORY 2024-10-27 [OrionP] Official Update 2024-09
// 
// 1 16 0 0 0 19 0 0 0 -0.25 0 0 0 19 4-4cylc3.dat
  [1,16,0,0,0,19,0,0,0,-0.25,0,0,0,19, ldraw_lib__4_4cylc3()],
// 1 16 0 -.25 0 0 0 -7.9 0 1 0 7.9 0 0 48\4-4disc.dat
  [1,16,0,-.25,0,0,0,-7.9,0,1,0,7.9,0,0, ldraw_lib__48__4_4disc()],
// 
// 0 BFC NOCLIP
  [0,"BFC","NOCLIP"],
// 1 15 0 -.25 0 1 0 0 0 1 0 0 0 1 s\820671as01.dat
  [1,15,0,-.25,0,1,0,0,0,1,0,0,0,1, ldraw_lib__s__820671as01()],
// 1 4 0 -.25 0 0 0 -1 0 1 0 1 0 0 s\820671as01.dat
  [1,4,0,-.25,0,0,0,-1,0,1,0,1,0,0, ldraw_lib__s__820671as01()],
// 1 15 0 -.25 0 -1 0 0 0 1 0 0 0 -1 s\820671as01.dat
  [1,15,0,-.25,0,-1,0,0,0,1,0,0,0,-1, ldraw_lib__s__820671as01()],
// 1 4 0 -.25 0 0 0 1 0 1 0 -1 0 0 s\820671as01.dat
  [1,4,0,-.25,0,0,0,1,0,1,0,-1,0,0, ldraw_lib__s__820671as01()],
// 1 4 0 -.25 0 -1 0 0 0 1 0 0 0 1 s\820671as01.dat
  [1,4,0,-.25,0,-1,0,0,0,1,0,0,0,1, ldraw_lib__s__820671as01()],
// 1 15 0 -.25 0 0 0 1 0 1 0 1 0 0 s\820671as01.dat
  [1,15,0,-.25,0,0,0,1,0,1,0,1,0,0, ldraw_lib__s__820671as01()],
// 1 4 0 -.25 0 1 0 0 0 1 0 0 0 -1 s\820671as01.dat
  [1,4,0,-.25,0,1,0,0,0,1,0,0,0,-1, ldraw_lib__s__820671as01()],
// 1 15 0 -.25 0 0 0 -1 0 1 0 -1 0 0 s\820671as01.dat
  [1,15,0,-.25,0,0,0,-1,0,1,0,-1,0,0, ldraw_lib__s__820671as01()],
// 0 BFC CLIP
  [0,"BFC","CLIP"],
// 1 16 0 -.25 0 1 0 0 0 1 0 0 0 1 s\820671as02.dat
  [1,16,0,-.25,0,1,0,0,0,1,0,0,0,1, ldraw_lib__s__820671as02()],
// 1 16 0 -.25 0 0 0 -1 0 1 0 1 0 0 s\820671as02.dat
  [1,16,0,-.25,0,0,0,-1,0,1,0,1,0,0, ldraw_lib__s__820671as02()],
// 1 16 0 -.25 0 -1 0 0 0 1 0 0 0 -1 s\820671as02.dat
  [1,16,0,-.25,0,-1,0,0,0,1,0,0,0,-1, ldraw_lib__s__820671as02()],
// 1 16 0 -.25 0 0 0 1 0 1 0 -1 0 0 s\820671as02.dat
  [1,16,0,-.25,0,0,0,1,0,1,0,-1,0,0, ldraw_lib__s__820671as02()],
// 1 16 0 -.25 0 -1 0 0 0 1 0 0 0 1 s\820671as02.dat
  [1,16,0,-.25,0,-1,0,0,0,1,0,0,0,1, ldraw_lib__s__820671as02()],
// 1 16 0 -.25 0 0 0 1 0 1 0 1 0 0 s\820671as02.dat
  [1,16,0,-.25,0,0,0,1,0,1,0,1,0,0, ldraw_lib__s__820671as02()],
// 1 16 0 -.25 0 1 0 0 0 1 0 0 0 -1 s\820671as02.dat
  [1,16,0,-.25,0,1,0,0,0,1,0,0,0,-1, ldraw_lib__s__820671as02()],
// 1 16 0 -.25 0 0 0 -1 0 1 0 -1 0 0 s\820671as02.dat
  [1,16,0,-.25,0,0,0,-1,0,1,0,-1,0,0, ldraw_lib__s__820671as02()],
];
module ldraw_lib__820671a(step=0, col=false, unit=2/5, alt=false, line=0.2, solid=!$preview)
    makepoly(ldraw_lib__820671a(), step=step, col=col, unit=unit, alt=alt, line=line, solid=solid);
ldraw_lib__820671a(line=0.2);
// main file
use <../lib.scad>
use <820671a.scad>
function ldraw_lib__s10() = [
// 0 ~Moved to 820671a
// 0 Name: s10.dat
// 0 Author: [PTadmin]
// 0 !LDRAW_ORG Part UPDATE 2022-04
// 0 !LICENSE Licensed under CC BY 4.0 : see CAreadme.txt
// 
// 0 BFC CERTIFY CCW
  [0,"BFC","CERTIFY"],
  [0,"BFC","CCW"],
// 
// 0 !CATEGORY Sticker Shortcut
// 
// 0 !HISTORY 2022-07-18 [PTadmin] Official Update 2022-04
// 
// 
// 0 // Sticker 1.9 x 1.9 Round with Lifepreserver
// 1 47 0 0 0 1 0 0 0 1 0 0 0 1 820671a.dat
  [1,47,0,0,0,1,0,0,0,1,0,0,0,1, ldraw_lib__820671a()],
];
module ldraw_lib__s10(step=0, col=false, unit=2/5, alt=false, line=0.2, solid=!$preview)
    makepoly(ldraw_lib__s10(), step=step, col=col, unit=unit, alt=alt, line=line, solid=solid);
ldraw_lib__s10(line=0.2);
